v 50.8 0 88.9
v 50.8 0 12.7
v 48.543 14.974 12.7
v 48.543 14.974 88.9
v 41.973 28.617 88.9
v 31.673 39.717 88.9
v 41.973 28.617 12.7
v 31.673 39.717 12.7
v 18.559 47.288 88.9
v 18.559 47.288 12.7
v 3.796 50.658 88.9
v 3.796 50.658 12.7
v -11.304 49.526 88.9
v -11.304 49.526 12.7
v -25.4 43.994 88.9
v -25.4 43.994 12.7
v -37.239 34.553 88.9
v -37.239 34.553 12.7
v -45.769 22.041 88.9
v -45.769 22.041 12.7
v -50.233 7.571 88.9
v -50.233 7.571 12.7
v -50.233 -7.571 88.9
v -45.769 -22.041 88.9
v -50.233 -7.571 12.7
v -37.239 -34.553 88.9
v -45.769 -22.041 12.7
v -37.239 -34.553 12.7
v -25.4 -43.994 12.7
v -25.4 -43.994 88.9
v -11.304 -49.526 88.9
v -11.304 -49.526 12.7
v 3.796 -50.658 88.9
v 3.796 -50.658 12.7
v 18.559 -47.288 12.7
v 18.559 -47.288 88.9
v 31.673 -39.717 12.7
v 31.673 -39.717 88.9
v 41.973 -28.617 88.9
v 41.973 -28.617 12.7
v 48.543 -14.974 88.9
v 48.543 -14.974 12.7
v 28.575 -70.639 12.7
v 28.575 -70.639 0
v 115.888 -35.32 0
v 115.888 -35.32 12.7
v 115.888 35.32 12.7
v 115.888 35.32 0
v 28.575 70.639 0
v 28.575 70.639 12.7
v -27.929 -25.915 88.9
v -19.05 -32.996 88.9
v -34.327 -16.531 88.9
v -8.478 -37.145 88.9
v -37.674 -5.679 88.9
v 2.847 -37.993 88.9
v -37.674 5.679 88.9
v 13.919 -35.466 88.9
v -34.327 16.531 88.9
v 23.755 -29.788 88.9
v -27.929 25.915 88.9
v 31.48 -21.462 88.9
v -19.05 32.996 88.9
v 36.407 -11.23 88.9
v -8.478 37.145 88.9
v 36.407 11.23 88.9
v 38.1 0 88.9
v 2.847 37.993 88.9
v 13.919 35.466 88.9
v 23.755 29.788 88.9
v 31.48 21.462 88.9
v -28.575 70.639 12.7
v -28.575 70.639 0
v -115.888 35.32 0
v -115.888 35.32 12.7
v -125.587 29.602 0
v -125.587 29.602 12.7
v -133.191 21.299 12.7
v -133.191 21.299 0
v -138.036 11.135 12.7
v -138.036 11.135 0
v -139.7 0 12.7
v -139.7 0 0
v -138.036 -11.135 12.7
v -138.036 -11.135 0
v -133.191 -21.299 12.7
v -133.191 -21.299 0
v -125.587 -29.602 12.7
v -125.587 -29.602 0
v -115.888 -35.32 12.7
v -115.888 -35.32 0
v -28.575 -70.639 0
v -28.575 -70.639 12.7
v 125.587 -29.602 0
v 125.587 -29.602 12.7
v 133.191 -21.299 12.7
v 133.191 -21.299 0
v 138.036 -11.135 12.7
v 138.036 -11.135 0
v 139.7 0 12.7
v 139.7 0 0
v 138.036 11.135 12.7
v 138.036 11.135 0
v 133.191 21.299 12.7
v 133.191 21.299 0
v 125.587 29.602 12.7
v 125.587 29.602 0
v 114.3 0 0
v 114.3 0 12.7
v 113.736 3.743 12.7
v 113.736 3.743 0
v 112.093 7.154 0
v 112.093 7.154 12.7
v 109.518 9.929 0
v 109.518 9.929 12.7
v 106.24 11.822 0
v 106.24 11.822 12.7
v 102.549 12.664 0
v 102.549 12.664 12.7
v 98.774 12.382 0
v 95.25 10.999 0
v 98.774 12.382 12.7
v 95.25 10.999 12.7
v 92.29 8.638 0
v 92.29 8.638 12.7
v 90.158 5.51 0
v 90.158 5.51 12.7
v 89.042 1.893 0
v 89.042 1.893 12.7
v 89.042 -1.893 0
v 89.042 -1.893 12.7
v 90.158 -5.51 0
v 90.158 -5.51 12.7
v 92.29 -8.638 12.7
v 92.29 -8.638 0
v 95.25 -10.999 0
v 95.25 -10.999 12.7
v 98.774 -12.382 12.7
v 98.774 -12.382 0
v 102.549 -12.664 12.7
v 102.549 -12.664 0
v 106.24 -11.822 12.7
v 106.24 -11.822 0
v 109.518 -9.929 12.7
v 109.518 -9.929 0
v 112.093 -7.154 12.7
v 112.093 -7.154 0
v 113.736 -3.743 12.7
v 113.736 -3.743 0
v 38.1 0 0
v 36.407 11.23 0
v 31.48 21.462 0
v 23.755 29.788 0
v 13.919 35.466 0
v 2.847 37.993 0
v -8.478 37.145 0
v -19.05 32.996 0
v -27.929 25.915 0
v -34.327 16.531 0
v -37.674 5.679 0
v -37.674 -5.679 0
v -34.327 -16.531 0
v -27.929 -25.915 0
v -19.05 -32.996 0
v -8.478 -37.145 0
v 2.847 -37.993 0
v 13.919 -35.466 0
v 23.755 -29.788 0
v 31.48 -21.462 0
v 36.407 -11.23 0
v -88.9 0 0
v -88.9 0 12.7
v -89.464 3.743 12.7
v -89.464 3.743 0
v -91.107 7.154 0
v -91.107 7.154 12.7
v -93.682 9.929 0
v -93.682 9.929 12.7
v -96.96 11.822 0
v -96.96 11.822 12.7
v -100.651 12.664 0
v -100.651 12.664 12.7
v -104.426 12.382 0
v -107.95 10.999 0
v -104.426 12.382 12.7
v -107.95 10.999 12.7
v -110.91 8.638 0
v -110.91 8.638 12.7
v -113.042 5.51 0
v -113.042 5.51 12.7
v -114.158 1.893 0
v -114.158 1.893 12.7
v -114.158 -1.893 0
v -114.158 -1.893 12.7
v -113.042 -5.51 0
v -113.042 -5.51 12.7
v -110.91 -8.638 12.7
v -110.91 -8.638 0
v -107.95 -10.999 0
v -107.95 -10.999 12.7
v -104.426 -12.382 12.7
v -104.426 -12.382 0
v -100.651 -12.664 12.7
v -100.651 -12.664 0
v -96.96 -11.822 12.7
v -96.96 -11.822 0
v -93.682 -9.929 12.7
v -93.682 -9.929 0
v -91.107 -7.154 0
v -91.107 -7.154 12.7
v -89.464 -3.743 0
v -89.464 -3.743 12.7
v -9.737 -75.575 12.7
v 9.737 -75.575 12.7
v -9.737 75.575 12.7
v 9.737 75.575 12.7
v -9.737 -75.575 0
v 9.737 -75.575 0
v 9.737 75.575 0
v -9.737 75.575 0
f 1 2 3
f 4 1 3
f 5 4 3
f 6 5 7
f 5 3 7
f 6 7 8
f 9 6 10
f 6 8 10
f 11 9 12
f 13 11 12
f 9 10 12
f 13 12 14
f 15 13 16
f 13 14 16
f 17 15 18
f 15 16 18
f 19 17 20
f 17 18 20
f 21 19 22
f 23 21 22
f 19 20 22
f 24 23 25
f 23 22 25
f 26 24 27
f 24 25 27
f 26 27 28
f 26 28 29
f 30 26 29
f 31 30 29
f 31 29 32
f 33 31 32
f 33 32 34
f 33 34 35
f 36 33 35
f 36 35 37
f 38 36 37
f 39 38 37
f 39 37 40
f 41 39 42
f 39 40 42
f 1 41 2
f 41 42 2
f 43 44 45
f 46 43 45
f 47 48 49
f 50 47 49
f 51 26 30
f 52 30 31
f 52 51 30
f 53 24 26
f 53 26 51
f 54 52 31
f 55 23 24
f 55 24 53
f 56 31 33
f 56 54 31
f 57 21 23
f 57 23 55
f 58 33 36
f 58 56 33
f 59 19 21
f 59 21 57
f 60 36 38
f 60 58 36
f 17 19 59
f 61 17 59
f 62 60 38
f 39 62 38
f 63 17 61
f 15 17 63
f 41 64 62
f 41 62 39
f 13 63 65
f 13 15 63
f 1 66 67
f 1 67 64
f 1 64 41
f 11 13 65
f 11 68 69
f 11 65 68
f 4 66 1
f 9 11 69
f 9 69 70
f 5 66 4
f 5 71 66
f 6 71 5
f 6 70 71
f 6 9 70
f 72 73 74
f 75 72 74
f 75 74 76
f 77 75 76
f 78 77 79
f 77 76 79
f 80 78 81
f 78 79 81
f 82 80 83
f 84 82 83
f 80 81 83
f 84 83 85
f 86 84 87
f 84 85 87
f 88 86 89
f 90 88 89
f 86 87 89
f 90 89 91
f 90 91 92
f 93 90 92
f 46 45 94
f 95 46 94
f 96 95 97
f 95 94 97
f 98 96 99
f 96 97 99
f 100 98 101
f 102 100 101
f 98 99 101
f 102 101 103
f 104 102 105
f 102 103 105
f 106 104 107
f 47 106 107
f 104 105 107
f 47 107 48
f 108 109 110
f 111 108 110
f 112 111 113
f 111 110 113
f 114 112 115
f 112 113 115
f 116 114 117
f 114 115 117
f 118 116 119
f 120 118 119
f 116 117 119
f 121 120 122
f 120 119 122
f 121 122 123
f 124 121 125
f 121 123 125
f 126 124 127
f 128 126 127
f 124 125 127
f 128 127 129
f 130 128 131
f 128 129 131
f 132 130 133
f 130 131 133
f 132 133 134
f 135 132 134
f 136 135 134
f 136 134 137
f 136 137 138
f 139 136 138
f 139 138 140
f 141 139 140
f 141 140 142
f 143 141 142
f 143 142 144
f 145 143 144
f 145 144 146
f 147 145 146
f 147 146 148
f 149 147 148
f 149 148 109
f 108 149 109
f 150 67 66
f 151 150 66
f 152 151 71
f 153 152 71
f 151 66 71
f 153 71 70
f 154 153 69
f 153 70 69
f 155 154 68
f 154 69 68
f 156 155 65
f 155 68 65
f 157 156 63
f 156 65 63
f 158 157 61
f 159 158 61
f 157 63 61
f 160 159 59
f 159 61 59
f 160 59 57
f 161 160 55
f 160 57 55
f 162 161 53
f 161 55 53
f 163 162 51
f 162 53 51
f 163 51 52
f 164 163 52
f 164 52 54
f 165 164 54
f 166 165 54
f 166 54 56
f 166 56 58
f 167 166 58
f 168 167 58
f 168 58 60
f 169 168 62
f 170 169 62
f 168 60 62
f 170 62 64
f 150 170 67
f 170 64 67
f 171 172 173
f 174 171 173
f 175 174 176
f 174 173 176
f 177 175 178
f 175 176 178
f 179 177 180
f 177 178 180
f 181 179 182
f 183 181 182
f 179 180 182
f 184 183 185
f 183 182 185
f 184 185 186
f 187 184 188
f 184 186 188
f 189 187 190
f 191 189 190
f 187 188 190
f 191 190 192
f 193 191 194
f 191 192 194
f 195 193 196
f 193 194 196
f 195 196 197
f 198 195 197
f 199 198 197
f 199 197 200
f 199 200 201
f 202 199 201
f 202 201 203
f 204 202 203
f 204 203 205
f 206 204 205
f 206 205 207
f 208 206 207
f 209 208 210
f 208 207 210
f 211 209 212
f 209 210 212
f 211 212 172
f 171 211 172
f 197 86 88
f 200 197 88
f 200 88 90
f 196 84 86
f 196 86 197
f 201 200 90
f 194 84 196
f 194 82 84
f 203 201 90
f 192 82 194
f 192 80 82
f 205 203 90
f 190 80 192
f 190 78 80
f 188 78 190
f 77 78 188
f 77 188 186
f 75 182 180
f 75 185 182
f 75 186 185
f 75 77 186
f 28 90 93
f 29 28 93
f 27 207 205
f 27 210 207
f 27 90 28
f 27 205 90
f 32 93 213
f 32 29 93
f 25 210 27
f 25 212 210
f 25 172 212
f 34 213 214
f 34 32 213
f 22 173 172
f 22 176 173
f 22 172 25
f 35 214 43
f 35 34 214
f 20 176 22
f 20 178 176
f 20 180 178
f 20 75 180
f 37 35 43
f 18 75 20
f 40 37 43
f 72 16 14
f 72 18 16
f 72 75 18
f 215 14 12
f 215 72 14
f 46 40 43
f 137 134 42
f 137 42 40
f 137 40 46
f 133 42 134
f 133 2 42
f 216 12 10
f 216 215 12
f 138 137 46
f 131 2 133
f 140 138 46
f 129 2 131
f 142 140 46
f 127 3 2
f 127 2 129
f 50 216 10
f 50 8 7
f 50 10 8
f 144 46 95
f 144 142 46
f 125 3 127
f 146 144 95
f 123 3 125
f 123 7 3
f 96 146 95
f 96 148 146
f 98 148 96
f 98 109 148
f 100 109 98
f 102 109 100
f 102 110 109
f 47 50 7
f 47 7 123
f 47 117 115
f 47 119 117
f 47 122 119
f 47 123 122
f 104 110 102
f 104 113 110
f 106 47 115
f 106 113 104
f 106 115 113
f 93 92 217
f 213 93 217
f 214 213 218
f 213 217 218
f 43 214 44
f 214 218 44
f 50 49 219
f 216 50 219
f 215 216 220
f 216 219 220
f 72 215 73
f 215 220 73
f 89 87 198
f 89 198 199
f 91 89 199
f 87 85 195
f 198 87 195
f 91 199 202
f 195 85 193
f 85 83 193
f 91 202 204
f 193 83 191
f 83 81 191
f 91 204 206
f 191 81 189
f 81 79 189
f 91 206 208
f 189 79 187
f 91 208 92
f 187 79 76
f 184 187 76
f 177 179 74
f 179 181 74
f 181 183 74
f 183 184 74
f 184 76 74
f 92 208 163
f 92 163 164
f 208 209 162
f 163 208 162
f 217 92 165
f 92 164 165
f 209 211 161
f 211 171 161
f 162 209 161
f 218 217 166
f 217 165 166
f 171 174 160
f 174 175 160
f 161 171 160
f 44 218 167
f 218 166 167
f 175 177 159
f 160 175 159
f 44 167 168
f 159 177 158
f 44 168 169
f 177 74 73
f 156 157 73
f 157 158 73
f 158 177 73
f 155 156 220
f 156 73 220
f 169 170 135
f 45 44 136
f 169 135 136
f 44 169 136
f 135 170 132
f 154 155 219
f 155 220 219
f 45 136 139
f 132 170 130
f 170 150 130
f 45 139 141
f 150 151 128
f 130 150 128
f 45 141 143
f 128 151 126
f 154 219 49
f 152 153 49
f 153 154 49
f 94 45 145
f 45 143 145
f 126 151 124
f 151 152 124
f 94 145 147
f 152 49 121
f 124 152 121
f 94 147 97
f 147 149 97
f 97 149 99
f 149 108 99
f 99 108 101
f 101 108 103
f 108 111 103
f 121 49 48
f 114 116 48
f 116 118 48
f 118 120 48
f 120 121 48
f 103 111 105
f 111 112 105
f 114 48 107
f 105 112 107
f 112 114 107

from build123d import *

# Parameters (mm, degrees)
F1_DEPTH = 12.7
F2_R     = 12.7
F3_DEPTH = 12.7
F4_R     = 12.7
F5_DEPTH = 25.4
F6_R     = 50.8
F7_DEPTH = 76.2
F8_R     = 38.1
F9_DEPTH = 88.9


with BuildPart() as f1:
    # F0 (on Top) → F1 (new body)
    with BuildSketch(Plane.XY):
        with BuildLine():
            Line((-115.8875, -35.319645), (-28.575, -70.639291))
            ThreePointArc((-28.575, -70.639291), (0, -76.2), (28.575, -70.639291))
            Line((28.575, -70.639291), (115.8875, -35.319645))
            ThreePointArc((115.8875, -35.319645), (139.7, 0), (115.8875, 35.319645))
            Line((115.8875, 35.319645), (28.575, 70.639291))
            ThreePointArc((28.575, 70.639291), (0, 76.2), (-28.575, 70.639291))
            Line((-28.575, 70.639291), (-115.8875, 35.319645))
            ThreePointArc((-115.8875, 35.319645), (-139.7, 0), (-115.8875, -35.319645))
        make_face()
    extrude(amount=F1_DEPTH)

    # F2 (on face) → F3 (cut, through all)
    with BuildSketch(Plane.XY.offset(12.7)):
        with Locations((-101.6, 0)):
            Circle(F2_R)
    extrude(amount=-F3_DEPTH, mode=Mode.SUBTRACT)

    # F4 (on face) → F5 (cut)
    with BuildSketch(Plane.XY.offset(12.7)):
        with Locations((101.6, 0)):
            Circle(F4_R)
    extrude(amount=-F5_DEPTH, mode=Mode.SUBTRACT)

    # F6 (on face) → F7 (join)
    with BuildSketch(Plane.XY.offset(12.7)):
        Circle(F6_R)
    extrude(amount=F7_DEPTH)

    # F8 (on face) → F9 (cut, through all)
    with BuildSketch(Plane.XY.offset(88.9)):
        Circle(F8_R)
    extrude(amount=-F9_DEPTH, mode=Mode.SUBTRACT)


solid = f1.part
